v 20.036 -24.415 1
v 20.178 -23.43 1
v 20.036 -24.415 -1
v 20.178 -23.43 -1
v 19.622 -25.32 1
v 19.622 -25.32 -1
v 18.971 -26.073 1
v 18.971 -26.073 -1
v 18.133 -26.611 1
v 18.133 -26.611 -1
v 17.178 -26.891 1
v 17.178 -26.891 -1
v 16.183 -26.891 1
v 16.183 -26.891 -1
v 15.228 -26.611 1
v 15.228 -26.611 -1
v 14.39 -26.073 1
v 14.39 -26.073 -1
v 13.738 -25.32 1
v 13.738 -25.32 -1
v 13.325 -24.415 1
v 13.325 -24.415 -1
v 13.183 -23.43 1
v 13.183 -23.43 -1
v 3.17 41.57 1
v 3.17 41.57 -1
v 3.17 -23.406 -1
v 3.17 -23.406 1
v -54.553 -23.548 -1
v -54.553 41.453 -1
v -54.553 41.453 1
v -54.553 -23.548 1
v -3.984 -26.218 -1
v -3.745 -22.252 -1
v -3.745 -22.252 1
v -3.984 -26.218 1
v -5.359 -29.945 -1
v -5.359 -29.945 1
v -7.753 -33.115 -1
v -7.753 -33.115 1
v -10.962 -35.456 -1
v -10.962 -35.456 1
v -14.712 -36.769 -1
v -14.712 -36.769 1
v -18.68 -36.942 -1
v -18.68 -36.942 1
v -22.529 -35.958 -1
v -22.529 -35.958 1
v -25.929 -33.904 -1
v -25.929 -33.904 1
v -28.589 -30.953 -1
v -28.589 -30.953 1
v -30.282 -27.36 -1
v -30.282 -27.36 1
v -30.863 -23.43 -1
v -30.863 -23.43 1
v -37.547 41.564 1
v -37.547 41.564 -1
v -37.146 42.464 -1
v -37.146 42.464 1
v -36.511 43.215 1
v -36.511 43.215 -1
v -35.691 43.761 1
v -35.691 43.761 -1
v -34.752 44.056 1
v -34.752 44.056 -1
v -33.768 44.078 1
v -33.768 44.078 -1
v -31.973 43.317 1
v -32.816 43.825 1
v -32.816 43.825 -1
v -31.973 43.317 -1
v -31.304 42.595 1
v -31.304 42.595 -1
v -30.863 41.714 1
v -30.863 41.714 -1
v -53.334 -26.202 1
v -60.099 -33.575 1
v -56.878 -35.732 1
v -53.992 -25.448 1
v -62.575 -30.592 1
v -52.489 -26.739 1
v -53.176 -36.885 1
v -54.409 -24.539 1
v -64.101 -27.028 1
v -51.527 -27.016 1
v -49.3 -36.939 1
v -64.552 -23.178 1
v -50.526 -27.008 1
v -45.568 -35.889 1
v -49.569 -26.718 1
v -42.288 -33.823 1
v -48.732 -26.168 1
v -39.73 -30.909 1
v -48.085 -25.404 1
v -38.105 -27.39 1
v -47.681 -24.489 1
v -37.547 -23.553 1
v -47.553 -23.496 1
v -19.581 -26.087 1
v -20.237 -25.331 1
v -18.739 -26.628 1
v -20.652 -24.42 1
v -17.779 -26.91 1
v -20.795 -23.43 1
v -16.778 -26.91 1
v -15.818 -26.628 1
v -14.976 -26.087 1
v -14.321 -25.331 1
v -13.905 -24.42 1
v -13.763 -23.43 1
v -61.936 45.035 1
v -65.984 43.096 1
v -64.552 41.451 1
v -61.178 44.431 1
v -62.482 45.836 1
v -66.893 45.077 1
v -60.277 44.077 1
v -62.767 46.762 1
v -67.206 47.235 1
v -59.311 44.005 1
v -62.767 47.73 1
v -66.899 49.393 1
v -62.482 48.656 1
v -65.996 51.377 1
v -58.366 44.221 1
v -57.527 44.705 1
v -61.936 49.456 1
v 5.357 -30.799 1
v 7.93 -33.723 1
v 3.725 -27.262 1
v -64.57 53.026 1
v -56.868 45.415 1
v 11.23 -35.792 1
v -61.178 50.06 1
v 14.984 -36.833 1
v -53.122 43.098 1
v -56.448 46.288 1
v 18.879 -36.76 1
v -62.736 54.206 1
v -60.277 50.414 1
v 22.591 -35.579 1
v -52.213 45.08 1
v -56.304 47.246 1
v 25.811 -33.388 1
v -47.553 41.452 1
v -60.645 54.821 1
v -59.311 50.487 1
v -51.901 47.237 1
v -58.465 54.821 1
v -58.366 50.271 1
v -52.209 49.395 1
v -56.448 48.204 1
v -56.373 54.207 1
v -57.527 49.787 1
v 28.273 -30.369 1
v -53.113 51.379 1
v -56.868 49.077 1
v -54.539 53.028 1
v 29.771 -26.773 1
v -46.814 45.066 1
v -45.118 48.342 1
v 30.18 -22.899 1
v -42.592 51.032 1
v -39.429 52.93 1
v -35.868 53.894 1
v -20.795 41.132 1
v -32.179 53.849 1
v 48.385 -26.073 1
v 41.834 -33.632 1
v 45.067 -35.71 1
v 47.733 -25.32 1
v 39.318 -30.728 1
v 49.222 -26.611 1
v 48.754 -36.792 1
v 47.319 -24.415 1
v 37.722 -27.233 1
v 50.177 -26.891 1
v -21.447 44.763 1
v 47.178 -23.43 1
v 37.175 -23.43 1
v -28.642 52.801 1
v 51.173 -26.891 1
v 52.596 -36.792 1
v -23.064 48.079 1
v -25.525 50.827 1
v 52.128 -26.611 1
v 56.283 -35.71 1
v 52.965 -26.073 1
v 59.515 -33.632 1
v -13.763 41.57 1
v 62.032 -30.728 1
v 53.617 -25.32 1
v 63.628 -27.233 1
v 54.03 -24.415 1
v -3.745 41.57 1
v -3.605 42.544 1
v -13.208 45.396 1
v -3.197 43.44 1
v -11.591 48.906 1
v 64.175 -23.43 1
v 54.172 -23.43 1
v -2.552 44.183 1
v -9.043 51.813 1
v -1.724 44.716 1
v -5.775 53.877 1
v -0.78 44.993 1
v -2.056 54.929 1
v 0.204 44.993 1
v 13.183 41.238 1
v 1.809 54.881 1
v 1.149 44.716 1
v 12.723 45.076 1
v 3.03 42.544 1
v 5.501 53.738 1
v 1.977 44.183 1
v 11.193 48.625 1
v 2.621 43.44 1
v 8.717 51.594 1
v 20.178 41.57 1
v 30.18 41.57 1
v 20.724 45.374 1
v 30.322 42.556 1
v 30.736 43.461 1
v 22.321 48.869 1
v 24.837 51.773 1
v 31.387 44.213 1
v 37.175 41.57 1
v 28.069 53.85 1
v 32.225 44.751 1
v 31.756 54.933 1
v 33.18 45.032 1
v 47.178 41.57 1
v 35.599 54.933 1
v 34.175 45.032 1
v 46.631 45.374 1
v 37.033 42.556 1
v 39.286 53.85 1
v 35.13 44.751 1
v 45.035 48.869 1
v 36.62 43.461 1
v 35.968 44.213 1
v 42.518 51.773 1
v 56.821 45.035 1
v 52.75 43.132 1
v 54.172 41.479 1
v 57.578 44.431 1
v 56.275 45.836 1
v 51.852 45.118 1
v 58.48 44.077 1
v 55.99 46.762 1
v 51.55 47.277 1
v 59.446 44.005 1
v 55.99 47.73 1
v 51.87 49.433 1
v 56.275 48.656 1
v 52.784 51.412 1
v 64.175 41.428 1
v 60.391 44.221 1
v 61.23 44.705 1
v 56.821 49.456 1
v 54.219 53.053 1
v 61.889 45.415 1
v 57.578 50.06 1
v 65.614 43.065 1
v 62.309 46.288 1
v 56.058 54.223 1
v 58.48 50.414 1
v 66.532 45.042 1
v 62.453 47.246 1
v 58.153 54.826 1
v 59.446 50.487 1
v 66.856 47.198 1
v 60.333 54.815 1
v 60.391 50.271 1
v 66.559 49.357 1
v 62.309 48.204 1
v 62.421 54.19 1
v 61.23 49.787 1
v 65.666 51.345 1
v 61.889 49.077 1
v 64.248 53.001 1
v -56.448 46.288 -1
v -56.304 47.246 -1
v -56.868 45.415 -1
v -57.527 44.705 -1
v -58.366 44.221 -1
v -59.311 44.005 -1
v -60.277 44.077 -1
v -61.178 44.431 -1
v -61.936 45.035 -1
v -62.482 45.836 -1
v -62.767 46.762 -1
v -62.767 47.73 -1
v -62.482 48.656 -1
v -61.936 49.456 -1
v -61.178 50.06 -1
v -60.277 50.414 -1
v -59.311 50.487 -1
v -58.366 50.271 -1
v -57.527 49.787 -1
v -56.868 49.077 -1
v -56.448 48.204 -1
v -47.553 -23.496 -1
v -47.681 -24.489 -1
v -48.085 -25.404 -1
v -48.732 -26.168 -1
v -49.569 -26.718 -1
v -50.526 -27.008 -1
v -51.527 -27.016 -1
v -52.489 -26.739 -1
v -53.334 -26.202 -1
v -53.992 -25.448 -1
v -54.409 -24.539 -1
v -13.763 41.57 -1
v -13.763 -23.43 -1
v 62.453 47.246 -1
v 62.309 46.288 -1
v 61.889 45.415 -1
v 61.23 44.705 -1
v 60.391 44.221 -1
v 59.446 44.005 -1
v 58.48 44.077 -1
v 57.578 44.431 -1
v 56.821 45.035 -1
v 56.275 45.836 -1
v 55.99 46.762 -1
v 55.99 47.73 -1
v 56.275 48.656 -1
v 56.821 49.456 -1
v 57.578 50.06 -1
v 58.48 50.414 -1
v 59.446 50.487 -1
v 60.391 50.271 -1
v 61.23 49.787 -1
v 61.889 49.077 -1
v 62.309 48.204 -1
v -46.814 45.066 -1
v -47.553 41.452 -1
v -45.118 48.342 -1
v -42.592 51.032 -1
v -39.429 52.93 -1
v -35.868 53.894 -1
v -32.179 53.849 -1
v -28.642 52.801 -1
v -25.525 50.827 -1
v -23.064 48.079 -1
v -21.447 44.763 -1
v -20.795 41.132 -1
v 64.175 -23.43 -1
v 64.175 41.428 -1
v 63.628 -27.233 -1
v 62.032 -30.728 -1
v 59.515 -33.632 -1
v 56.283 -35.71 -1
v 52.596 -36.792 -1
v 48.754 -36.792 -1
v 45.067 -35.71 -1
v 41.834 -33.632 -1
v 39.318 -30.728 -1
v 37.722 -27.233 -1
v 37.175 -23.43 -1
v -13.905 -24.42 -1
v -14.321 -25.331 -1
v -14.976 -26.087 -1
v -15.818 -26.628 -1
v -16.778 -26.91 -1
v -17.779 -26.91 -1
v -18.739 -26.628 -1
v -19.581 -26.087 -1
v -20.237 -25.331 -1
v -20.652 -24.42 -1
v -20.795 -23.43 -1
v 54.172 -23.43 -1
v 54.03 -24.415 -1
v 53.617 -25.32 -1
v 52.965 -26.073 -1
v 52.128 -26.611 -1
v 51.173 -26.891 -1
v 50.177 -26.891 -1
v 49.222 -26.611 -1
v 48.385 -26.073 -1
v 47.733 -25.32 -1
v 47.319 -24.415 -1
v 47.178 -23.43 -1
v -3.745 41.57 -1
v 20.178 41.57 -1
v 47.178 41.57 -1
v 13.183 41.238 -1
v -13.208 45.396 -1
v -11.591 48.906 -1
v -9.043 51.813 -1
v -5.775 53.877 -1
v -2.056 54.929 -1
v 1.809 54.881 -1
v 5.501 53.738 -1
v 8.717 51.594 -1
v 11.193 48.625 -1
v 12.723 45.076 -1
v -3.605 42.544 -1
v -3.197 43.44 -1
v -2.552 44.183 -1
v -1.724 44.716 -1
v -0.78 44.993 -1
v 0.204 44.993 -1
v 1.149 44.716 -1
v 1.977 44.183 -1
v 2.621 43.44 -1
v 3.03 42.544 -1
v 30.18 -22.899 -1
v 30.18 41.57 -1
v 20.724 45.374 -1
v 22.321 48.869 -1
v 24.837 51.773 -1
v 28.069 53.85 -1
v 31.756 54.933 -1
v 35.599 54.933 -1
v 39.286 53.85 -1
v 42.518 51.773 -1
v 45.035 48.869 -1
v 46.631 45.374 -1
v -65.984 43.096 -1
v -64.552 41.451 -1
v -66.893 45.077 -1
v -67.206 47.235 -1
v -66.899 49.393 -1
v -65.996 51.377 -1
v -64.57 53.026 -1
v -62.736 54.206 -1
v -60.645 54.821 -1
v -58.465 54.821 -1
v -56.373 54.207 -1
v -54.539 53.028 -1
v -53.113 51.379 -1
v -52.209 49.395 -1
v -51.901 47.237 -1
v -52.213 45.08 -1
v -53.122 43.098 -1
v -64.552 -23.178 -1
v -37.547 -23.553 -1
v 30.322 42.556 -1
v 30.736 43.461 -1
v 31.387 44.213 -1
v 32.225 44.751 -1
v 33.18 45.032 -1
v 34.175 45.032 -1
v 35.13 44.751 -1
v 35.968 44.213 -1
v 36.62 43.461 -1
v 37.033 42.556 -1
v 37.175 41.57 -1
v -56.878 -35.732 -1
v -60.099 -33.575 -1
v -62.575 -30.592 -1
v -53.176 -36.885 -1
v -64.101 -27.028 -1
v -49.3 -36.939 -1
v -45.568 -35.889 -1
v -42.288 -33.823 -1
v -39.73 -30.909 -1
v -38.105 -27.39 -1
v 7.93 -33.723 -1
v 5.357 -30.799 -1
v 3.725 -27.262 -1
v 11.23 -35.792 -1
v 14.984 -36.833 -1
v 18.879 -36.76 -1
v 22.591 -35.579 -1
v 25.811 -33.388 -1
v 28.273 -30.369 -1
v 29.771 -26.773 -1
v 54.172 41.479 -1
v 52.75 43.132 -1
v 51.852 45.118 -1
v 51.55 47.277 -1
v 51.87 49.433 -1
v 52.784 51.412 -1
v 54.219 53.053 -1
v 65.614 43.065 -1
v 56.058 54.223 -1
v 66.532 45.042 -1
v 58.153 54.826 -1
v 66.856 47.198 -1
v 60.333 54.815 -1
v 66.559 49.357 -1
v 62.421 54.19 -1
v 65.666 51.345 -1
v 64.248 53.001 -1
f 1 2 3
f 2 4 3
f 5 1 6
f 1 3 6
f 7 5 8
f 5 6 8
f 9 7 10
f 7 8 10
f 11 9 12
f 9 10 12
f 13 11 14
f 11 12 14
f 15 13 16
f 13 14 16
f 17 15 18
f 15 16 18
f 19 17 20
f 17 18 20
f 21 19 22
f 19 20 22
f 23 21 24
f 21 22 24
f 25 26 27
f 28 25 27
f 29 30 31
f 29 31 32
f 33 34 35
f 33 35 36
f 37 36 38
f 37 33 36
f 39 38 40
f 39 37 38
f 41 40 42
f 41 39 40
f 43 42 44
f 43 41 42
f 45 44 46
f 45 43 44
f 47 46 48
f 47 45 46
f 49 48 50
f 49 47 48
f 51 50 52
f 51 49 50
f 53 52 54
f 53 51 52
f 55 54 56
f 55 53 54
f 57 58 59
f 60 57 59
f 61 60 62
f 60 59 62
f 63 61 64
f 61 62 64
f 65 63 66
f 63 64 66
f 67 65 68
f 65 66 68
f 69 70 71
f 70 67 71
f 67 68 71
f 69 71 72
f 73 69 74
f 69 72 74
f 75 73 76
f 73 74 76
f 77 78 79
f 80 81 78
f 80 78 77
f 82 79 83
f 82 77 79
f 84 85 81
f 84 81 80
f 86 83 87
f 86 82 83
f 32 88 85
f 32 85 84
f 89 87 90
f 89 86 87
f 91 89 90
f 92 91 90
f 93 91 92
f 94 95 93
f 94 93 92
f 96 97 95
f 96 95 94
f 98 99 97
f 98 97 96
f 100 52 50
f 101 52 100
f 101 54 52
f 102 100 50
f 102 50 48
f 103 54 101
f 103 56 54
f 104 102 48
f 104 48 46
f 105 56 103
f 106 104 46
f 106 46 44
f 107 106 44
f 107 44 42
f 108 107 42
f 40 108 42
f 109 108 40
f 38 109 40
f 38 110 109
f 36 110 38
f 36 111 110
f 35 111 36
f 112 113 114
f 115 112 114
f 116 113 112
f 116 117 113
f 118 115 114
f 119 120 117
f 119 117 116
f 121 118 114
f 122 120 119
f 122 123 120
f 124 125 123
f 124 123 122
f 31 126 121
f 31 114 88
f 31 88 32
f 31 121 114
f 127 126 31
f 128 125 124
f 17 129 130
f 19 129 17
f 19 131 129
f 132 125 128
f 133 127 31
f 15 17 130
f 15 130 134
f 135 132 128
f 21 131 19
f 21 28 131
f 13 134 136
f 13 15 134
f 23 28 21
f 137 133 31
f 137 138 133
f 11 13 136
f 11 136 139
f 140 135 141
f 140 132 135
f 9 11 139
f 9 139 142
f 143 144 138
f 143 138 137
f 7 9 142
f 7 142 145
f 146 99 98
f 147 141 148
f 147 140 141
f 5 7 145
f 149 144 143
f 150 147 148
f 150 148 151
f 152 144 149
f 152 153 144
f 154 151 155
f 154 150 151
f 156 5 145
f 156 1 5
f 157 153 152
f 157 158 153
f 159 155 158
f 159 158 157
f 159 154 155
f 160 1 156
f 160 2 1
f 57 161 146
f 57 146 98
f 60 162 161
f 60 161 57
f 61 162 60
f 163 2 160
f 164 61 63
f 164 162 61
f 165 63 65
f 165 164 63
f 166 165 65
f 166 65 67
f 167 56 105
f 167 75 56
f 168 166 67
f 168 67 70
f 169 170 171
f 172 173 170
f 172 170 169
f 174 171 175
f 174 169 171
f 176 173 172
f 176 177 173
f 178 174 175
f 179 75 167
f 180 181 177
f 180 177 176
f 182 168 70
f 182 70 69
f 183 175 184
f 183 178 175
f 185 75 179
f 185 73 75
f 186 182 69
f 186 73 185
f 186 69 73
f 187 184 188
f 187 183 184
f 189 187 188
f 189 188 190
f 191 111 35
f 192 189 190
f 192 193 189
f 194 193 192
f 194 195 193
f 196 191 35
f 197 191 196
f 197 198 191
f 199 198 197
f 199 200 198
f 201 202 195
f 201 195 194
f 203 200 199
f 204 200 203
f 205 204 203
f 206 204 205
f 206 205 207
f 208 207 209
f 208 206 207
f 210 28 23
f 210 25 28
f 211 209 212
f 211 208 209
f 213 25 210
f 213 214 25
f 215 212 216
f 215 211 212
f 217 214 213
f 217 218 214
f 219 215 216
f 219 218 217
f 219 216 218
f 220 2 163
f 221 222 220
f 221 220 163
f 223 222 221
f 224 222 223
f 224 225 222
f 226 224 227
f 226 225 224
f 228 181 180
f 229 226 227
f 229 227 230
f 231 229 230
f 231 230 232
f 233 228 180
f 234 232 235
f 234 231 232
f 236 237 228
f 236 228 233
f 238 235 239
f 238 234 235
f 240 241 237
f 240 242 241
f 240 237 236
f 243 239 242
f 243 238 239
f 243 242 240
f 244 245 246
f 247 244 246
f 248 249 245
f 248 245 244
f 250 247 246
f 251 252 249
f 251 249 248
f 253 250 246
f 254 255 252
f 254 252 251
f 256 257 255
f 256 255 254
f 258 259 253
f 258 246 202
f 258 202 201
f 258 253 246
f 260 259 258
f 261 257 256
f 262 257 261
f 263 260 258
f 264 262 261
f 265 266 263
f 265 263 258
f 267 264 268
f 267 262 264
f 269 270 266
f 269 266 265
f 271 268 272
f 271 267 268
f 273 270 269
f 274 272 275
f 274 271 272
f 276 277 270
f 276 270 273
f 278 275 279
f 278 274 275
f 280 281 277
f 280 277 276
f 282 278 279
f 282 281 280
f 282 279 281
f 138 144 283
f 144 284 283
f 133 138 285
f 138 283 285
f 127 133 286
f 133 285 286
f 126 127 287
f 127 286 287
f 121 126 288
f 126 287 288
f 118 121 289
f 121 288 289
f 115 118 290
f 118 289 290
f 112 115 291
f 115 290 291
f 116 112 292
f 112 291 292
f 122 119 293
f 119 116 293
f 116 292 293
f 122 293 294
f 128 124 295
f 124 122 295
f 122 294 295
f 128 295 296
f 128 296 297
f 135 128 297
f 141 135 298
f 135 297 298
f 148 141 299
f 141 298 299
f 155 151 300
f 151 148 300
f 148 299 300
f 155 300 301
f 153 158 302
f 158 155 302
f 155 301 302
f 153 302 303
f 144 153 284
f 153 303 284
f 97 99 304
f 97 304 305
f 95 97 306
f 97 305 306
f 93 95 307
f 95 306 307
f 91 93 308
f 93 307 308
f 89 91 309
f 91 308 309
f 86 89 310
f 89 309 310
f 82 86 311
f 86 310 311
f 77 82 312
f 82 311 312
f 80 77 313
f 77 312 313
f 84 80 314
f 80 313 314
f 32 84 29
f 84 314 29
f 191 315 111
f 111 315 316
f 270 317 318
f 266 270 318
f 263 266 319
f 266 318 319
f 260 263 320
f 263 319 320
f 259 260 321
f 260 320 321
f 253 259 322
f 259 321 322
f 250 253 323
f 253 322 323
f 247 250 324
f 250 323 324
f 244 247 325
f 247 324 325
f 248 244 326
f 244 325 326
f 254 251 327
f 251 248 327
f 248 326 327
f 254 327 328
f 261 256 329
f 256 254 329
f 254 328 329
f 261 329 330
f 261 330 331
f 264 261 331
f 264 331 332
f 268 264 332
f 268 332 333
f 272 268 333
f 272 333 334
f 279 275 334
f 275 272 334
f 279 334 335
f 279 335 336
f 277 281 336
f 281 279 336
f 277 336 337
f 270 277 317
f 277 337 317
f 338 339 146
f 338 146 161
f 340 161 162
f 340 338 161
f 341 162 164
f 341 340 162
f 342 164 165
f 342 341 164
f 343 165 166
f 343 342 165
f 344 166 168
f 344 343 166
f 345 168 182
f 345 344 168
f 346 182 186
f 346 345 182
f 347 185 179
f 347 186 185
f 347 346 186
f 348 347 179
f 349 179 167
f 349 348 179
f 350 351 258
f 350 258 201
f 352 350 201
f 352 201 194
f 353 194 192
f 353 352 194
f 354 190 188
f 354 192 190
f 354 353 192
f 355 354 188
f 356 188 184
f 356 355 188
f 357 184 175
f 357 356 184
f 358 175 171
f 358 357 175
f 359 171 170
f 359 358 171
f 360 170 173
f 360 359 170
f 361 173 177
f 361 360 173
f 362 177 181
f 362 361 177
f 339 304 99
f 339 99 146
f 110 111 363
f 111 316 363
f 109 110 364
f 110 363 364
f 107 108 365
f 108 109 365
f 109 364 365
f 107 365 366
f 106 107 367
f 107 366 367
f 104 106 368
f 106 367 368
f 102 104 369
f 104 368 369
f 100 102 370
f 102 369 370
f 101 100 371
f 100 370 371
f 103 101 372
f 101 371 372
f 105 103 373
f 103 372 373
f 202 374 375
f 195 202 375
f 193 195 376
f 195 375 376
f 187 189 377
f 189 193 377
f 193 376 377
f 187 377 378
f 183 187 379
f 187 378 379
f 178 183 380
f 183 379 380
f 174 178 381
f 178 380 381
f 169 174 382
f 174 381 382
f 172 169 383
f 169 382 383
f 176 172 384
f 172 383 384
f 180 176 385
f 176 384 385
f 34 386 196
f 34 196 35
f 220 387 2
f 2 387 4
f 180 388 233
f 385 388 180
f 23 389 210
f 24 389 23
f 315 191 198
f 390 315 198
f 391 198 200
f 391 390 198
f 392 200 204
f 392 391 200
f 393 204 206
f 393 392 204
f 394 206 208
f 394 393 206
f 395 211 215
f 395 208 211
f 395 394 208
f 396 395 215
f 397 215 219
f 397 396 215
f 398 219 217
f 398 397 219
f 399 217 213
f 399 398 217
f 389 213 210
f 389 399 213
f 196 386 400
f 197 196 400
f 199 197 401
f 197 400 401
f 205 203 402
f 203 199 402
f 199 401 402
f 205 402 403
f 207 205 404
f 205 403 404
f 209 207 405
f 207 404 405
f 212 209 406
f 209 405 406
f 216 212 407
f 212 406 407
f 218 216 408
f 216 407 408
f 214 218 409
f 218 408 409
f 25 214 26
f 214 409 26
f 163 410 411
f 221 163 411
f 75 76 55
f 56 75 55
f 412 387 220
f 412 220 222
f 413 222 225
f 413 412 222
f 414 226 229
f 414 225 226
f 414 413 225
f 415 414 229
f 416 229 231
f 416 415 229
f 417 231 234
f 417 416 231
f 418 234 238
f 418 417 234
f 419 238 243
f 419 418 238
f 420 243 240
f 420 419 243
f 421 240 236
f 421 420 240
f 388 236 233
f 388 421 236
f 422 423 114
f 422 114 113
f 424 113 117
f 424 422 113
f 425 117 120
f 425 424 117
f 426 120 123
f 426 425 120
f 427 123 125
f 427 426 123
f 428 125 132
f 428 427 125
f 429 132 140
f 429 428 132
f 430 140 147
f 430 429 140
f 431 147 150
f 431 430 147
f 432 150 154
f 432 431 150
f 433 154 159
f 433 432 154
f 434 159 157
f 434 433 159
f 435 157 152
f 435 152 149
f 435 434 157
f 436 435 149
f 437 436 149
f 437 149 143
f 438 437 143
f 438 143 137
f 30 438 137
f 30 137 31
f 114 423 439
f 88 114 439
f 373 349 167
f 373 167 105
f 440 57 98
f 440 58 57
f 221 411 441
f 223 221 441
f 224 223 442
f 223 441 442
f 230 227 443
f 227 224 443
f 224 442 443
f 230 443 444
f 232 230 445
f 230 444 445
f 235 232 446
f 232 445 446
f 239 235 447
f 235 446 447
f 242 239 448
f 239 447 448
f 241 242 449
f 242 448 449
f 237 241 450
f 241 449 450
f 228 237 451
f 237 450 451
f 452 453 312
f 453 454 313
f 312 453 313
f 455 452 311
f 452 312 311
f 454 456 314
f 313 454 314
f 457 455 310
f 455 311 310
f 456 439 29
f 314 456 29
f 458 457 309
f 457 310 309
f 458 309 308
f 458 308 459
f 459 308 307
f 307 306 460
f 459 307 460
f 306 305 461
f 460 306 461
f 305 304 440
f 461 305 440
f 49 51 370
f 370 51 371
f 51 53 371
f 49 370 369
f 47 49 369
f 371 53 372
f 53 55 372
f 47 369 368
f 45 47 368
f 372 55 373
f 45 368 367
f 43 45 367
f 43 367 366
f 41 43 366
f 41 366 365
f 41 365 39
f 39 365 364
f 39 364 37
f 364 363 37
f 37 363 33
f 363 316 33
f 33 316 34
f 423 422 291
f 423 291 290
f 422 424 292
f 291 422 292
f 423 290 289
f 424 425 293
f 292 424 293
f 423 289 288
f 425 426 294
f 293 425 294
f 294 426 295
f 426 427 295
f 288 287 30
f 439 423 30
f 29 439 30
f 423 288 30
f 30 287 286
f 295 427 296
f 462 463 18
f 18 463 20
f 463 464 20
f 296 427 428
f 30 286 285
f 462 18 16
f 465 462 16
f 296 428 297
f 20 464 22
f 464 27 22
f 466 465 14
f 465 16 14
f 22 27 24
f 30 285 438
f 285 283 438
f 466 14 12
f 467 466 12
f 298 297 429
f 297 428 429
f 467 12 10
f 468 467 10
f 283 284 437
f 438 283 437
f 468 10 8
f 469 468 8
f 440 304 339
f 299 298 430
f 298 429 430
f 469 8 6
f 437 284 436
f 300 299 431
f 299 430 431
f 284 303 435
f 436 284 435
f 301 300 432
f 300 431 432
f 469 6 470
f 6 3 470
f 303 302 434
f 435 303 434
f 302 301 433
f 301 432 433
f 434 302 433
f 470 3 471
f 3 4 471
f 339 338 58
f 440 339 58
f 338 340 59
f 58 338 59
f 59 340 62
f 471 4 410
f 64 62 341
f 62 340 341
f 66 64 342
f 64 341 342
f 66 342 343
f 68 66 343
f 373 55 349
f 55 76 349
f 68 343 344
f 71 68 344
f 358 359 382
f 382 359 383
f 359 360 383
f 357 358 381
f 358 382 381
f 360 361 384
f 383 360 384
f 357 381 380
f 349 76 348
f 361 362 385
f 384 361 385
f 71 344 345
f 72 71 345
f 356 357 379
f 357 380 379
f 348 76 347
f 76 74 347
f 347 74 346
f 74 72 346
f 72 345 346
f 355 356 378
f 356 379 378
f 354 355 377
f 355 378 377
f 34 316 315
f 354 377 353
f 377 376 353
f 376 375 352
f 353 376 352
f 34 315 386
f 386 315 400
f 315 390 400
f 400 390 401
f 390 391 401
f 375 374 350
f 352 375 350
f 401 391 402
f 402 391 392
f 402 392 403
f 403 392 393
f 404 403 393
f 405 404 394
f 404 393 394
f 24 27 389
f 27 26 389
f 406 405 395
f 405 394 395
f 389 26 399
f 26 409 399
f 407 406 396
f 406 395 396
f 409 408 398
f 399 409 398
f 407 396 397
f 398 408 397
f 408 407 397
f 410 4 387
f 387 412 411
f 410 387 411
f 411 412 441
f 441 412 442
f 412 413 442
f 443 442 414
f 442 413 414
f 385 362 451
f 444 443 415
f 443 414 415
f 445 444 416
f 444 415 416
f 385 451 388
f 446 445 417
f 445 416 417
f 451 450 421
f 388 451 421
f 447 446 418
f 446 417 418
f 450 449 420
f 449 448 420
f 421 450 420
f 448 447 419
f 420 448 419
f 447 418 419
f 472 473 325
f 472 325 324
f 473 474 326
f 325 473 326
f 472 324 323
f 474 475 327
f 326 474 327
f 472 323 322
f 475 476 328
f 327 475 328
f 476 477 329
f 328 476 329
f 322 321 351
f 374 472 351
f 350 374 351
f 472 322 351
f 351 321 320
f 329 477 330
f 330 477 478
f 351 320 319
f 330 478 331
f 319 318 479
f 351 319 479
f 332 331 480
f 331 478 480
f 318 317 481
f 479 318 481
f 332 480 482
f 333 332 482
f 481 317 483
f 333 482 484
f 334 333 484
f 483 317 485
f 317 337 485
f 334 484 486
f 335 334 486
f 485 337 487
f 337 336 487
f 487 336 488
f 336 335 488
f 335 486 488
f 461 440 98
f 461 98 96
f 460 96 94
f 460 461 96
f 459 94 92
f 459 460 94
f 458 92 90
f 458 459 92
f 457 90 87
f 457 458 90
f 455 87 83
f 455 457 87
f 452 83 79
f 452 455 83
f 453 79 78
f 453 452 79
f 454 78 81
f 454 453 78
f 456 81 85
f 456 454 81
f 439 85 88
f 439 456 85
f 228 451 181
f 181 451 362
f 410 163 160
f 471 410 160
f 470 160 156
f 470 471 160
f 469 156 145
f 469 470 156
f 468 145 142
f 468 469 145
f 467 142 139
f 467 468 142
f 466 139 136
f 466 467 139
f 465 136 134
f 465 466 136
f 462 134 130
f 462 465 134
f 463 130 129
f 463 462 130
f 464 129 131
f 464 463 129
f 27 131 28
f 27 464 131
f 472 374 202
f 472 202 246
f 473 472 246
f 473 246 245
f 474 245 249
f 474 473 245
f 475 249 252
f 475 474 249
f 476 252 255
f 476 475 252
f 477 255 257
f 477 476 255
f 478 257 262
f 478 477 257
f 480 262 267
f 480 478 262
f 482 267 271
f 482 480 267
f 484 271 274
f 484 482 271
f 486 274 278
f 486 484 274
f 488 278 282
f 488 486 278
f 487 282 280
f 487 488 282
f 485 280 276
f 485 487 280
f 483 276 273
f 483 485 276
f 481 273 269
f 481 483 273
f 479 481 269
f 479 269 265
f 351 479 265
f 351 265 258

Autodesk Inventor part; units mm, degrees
ref_plane "YZ Plane" through (0, 0, 0) normal (1, 0, 0) x (0, 1, 0)
ref_plane "XZ Plane" through (0, 0, 0) normal (0, 1, 0) x (-1, 0, 0)
ref_plane "XY Plane" through (0, 0, 0) normal (0, 0, 1) x (1, 0, 0)
sketch "Sketch1" plane through (0, 0, 0) normal (0, 0, 1) x (1, 0, 0)
  circle A0 centre (-59.5535, 47.2459) radius 7.653
  line L0 (-64.5524, 41.4512) -> (-64.5524, -23.1778)
  line L1 (-54.5526, 41.4529) -> (-54.5526, -23.5479)
  arc A1 (-54.5526, -23.5479) -> (-47.5527, -23.4962) centre (-51.0525, -23.5479) ccw
  line L2 (-47.5527, -23.4962) -> (-47.5527, 41.452)
  line L3 (-37.5474, 41.5644) -> (-37.5474, -23.5532)
  arc A2 (-64.5524, -23.1778) -> (-37.5474, -23.5515) centre (-51.0525, -23.5479) ccw
  arc A3 (-30.8632, 41.7144) -> (-37.5474, 41.5644) centre (-34.182, 40.6024) ccw
  line L4 (-30.8632, 41.7144) -> (-30.8632, -23.4297)
  line L5 (-20.7948, 41.1318) -> (-20.7948, -23.4297)
  arc A4 (-20.7947, 41.1274) -> (-47.5527, 41.452) centre (-34.182, 40.6024) ccw
  line L6 (-13.7626, 41.5703) -> (-13.7626, -23.4297)
  arc A5 (-20.7948, -23.4297) -> (-13.7626, -23.4297) centre (-17.2787, -23.4297) ccw
  line L7 (-3.7454, 41.5703) -> (-3.7454, -22.2525)
  arc A6 (-30.8632, -23.4297) -> (-3.7454, -22.2525) centre (-17.2787, -23.4297) ccw
  line L8 (3.17, 41.5703) -> (3.17, -23.406)
  line L9 (13.1831, 41.5703) -> (13.1831, -23.4297)
  arc A7 (3.17, 41.5703) -> (-3.7454, 41.5703) centre (-0.2877, 41.5703) ccw
  arc A8 (13.1831, 41.2384) -> (-13.7626, 41.5703) centre (-0.2877, 41.5703) ccw
  line L10 (20.1776, 41.5703) -> (20.1776, -23.4297)
  arc A9 (13.1831, -23.4297) -> (20.1776, -23.4297) centre (16.6804, -23.4297) ccw
  line L11 (30.1804, -22.8989) -> (30.1804, 41.5703)
  arc A10 (3.17, -23.406) -> (30.1804, -22.8989) centre (16.6804, -23.4297) ccw
  line L12 (37.1748, 41.5703) -> (37.1748, -23.4297)
  line L13 (47.1776, 41.5703) -> (47.1776, -23.4297)
  arc A11 (37.1748, 41.5703) -> (30.1804, 41.5703) centre (33.6776, 41.5703) ccw
  arc A12 (47.1776, 41.5703) -> (20.1776, 41.5703) centre (33.6776, 41.5703) ccw
  circle A13 centre (-59.5535, 47.2459) radius 3.25
  line L14 (54.172, -23.4297) -> (54.172, 41.4793)
  line L15 (64.1748, 41.4275) -> (64.1748, -23.4297)
  arc A14 (47.1776, -23.4297) -> (54.172, -23.4297) centre (50.6748, -23.4297) ccw
  arc A15 (37.1748, -23.4297) -> (64.1748, -23.4297) centre (50.6748, -23.4297) ccw
  circle A16 centre (59.2034, 47.2459) radius 7.653
  circle A17 centre (59.2034, 47.2459) radius 3.25
  point P0 (0, 0)
  point P1 (-51.0266, -27.048)
  point P2 (-51.2393, -37.0517)
extrude "Extrusion1" add sketch "Sketch1" along normal mid plane 2
properties part number "sensor2"
